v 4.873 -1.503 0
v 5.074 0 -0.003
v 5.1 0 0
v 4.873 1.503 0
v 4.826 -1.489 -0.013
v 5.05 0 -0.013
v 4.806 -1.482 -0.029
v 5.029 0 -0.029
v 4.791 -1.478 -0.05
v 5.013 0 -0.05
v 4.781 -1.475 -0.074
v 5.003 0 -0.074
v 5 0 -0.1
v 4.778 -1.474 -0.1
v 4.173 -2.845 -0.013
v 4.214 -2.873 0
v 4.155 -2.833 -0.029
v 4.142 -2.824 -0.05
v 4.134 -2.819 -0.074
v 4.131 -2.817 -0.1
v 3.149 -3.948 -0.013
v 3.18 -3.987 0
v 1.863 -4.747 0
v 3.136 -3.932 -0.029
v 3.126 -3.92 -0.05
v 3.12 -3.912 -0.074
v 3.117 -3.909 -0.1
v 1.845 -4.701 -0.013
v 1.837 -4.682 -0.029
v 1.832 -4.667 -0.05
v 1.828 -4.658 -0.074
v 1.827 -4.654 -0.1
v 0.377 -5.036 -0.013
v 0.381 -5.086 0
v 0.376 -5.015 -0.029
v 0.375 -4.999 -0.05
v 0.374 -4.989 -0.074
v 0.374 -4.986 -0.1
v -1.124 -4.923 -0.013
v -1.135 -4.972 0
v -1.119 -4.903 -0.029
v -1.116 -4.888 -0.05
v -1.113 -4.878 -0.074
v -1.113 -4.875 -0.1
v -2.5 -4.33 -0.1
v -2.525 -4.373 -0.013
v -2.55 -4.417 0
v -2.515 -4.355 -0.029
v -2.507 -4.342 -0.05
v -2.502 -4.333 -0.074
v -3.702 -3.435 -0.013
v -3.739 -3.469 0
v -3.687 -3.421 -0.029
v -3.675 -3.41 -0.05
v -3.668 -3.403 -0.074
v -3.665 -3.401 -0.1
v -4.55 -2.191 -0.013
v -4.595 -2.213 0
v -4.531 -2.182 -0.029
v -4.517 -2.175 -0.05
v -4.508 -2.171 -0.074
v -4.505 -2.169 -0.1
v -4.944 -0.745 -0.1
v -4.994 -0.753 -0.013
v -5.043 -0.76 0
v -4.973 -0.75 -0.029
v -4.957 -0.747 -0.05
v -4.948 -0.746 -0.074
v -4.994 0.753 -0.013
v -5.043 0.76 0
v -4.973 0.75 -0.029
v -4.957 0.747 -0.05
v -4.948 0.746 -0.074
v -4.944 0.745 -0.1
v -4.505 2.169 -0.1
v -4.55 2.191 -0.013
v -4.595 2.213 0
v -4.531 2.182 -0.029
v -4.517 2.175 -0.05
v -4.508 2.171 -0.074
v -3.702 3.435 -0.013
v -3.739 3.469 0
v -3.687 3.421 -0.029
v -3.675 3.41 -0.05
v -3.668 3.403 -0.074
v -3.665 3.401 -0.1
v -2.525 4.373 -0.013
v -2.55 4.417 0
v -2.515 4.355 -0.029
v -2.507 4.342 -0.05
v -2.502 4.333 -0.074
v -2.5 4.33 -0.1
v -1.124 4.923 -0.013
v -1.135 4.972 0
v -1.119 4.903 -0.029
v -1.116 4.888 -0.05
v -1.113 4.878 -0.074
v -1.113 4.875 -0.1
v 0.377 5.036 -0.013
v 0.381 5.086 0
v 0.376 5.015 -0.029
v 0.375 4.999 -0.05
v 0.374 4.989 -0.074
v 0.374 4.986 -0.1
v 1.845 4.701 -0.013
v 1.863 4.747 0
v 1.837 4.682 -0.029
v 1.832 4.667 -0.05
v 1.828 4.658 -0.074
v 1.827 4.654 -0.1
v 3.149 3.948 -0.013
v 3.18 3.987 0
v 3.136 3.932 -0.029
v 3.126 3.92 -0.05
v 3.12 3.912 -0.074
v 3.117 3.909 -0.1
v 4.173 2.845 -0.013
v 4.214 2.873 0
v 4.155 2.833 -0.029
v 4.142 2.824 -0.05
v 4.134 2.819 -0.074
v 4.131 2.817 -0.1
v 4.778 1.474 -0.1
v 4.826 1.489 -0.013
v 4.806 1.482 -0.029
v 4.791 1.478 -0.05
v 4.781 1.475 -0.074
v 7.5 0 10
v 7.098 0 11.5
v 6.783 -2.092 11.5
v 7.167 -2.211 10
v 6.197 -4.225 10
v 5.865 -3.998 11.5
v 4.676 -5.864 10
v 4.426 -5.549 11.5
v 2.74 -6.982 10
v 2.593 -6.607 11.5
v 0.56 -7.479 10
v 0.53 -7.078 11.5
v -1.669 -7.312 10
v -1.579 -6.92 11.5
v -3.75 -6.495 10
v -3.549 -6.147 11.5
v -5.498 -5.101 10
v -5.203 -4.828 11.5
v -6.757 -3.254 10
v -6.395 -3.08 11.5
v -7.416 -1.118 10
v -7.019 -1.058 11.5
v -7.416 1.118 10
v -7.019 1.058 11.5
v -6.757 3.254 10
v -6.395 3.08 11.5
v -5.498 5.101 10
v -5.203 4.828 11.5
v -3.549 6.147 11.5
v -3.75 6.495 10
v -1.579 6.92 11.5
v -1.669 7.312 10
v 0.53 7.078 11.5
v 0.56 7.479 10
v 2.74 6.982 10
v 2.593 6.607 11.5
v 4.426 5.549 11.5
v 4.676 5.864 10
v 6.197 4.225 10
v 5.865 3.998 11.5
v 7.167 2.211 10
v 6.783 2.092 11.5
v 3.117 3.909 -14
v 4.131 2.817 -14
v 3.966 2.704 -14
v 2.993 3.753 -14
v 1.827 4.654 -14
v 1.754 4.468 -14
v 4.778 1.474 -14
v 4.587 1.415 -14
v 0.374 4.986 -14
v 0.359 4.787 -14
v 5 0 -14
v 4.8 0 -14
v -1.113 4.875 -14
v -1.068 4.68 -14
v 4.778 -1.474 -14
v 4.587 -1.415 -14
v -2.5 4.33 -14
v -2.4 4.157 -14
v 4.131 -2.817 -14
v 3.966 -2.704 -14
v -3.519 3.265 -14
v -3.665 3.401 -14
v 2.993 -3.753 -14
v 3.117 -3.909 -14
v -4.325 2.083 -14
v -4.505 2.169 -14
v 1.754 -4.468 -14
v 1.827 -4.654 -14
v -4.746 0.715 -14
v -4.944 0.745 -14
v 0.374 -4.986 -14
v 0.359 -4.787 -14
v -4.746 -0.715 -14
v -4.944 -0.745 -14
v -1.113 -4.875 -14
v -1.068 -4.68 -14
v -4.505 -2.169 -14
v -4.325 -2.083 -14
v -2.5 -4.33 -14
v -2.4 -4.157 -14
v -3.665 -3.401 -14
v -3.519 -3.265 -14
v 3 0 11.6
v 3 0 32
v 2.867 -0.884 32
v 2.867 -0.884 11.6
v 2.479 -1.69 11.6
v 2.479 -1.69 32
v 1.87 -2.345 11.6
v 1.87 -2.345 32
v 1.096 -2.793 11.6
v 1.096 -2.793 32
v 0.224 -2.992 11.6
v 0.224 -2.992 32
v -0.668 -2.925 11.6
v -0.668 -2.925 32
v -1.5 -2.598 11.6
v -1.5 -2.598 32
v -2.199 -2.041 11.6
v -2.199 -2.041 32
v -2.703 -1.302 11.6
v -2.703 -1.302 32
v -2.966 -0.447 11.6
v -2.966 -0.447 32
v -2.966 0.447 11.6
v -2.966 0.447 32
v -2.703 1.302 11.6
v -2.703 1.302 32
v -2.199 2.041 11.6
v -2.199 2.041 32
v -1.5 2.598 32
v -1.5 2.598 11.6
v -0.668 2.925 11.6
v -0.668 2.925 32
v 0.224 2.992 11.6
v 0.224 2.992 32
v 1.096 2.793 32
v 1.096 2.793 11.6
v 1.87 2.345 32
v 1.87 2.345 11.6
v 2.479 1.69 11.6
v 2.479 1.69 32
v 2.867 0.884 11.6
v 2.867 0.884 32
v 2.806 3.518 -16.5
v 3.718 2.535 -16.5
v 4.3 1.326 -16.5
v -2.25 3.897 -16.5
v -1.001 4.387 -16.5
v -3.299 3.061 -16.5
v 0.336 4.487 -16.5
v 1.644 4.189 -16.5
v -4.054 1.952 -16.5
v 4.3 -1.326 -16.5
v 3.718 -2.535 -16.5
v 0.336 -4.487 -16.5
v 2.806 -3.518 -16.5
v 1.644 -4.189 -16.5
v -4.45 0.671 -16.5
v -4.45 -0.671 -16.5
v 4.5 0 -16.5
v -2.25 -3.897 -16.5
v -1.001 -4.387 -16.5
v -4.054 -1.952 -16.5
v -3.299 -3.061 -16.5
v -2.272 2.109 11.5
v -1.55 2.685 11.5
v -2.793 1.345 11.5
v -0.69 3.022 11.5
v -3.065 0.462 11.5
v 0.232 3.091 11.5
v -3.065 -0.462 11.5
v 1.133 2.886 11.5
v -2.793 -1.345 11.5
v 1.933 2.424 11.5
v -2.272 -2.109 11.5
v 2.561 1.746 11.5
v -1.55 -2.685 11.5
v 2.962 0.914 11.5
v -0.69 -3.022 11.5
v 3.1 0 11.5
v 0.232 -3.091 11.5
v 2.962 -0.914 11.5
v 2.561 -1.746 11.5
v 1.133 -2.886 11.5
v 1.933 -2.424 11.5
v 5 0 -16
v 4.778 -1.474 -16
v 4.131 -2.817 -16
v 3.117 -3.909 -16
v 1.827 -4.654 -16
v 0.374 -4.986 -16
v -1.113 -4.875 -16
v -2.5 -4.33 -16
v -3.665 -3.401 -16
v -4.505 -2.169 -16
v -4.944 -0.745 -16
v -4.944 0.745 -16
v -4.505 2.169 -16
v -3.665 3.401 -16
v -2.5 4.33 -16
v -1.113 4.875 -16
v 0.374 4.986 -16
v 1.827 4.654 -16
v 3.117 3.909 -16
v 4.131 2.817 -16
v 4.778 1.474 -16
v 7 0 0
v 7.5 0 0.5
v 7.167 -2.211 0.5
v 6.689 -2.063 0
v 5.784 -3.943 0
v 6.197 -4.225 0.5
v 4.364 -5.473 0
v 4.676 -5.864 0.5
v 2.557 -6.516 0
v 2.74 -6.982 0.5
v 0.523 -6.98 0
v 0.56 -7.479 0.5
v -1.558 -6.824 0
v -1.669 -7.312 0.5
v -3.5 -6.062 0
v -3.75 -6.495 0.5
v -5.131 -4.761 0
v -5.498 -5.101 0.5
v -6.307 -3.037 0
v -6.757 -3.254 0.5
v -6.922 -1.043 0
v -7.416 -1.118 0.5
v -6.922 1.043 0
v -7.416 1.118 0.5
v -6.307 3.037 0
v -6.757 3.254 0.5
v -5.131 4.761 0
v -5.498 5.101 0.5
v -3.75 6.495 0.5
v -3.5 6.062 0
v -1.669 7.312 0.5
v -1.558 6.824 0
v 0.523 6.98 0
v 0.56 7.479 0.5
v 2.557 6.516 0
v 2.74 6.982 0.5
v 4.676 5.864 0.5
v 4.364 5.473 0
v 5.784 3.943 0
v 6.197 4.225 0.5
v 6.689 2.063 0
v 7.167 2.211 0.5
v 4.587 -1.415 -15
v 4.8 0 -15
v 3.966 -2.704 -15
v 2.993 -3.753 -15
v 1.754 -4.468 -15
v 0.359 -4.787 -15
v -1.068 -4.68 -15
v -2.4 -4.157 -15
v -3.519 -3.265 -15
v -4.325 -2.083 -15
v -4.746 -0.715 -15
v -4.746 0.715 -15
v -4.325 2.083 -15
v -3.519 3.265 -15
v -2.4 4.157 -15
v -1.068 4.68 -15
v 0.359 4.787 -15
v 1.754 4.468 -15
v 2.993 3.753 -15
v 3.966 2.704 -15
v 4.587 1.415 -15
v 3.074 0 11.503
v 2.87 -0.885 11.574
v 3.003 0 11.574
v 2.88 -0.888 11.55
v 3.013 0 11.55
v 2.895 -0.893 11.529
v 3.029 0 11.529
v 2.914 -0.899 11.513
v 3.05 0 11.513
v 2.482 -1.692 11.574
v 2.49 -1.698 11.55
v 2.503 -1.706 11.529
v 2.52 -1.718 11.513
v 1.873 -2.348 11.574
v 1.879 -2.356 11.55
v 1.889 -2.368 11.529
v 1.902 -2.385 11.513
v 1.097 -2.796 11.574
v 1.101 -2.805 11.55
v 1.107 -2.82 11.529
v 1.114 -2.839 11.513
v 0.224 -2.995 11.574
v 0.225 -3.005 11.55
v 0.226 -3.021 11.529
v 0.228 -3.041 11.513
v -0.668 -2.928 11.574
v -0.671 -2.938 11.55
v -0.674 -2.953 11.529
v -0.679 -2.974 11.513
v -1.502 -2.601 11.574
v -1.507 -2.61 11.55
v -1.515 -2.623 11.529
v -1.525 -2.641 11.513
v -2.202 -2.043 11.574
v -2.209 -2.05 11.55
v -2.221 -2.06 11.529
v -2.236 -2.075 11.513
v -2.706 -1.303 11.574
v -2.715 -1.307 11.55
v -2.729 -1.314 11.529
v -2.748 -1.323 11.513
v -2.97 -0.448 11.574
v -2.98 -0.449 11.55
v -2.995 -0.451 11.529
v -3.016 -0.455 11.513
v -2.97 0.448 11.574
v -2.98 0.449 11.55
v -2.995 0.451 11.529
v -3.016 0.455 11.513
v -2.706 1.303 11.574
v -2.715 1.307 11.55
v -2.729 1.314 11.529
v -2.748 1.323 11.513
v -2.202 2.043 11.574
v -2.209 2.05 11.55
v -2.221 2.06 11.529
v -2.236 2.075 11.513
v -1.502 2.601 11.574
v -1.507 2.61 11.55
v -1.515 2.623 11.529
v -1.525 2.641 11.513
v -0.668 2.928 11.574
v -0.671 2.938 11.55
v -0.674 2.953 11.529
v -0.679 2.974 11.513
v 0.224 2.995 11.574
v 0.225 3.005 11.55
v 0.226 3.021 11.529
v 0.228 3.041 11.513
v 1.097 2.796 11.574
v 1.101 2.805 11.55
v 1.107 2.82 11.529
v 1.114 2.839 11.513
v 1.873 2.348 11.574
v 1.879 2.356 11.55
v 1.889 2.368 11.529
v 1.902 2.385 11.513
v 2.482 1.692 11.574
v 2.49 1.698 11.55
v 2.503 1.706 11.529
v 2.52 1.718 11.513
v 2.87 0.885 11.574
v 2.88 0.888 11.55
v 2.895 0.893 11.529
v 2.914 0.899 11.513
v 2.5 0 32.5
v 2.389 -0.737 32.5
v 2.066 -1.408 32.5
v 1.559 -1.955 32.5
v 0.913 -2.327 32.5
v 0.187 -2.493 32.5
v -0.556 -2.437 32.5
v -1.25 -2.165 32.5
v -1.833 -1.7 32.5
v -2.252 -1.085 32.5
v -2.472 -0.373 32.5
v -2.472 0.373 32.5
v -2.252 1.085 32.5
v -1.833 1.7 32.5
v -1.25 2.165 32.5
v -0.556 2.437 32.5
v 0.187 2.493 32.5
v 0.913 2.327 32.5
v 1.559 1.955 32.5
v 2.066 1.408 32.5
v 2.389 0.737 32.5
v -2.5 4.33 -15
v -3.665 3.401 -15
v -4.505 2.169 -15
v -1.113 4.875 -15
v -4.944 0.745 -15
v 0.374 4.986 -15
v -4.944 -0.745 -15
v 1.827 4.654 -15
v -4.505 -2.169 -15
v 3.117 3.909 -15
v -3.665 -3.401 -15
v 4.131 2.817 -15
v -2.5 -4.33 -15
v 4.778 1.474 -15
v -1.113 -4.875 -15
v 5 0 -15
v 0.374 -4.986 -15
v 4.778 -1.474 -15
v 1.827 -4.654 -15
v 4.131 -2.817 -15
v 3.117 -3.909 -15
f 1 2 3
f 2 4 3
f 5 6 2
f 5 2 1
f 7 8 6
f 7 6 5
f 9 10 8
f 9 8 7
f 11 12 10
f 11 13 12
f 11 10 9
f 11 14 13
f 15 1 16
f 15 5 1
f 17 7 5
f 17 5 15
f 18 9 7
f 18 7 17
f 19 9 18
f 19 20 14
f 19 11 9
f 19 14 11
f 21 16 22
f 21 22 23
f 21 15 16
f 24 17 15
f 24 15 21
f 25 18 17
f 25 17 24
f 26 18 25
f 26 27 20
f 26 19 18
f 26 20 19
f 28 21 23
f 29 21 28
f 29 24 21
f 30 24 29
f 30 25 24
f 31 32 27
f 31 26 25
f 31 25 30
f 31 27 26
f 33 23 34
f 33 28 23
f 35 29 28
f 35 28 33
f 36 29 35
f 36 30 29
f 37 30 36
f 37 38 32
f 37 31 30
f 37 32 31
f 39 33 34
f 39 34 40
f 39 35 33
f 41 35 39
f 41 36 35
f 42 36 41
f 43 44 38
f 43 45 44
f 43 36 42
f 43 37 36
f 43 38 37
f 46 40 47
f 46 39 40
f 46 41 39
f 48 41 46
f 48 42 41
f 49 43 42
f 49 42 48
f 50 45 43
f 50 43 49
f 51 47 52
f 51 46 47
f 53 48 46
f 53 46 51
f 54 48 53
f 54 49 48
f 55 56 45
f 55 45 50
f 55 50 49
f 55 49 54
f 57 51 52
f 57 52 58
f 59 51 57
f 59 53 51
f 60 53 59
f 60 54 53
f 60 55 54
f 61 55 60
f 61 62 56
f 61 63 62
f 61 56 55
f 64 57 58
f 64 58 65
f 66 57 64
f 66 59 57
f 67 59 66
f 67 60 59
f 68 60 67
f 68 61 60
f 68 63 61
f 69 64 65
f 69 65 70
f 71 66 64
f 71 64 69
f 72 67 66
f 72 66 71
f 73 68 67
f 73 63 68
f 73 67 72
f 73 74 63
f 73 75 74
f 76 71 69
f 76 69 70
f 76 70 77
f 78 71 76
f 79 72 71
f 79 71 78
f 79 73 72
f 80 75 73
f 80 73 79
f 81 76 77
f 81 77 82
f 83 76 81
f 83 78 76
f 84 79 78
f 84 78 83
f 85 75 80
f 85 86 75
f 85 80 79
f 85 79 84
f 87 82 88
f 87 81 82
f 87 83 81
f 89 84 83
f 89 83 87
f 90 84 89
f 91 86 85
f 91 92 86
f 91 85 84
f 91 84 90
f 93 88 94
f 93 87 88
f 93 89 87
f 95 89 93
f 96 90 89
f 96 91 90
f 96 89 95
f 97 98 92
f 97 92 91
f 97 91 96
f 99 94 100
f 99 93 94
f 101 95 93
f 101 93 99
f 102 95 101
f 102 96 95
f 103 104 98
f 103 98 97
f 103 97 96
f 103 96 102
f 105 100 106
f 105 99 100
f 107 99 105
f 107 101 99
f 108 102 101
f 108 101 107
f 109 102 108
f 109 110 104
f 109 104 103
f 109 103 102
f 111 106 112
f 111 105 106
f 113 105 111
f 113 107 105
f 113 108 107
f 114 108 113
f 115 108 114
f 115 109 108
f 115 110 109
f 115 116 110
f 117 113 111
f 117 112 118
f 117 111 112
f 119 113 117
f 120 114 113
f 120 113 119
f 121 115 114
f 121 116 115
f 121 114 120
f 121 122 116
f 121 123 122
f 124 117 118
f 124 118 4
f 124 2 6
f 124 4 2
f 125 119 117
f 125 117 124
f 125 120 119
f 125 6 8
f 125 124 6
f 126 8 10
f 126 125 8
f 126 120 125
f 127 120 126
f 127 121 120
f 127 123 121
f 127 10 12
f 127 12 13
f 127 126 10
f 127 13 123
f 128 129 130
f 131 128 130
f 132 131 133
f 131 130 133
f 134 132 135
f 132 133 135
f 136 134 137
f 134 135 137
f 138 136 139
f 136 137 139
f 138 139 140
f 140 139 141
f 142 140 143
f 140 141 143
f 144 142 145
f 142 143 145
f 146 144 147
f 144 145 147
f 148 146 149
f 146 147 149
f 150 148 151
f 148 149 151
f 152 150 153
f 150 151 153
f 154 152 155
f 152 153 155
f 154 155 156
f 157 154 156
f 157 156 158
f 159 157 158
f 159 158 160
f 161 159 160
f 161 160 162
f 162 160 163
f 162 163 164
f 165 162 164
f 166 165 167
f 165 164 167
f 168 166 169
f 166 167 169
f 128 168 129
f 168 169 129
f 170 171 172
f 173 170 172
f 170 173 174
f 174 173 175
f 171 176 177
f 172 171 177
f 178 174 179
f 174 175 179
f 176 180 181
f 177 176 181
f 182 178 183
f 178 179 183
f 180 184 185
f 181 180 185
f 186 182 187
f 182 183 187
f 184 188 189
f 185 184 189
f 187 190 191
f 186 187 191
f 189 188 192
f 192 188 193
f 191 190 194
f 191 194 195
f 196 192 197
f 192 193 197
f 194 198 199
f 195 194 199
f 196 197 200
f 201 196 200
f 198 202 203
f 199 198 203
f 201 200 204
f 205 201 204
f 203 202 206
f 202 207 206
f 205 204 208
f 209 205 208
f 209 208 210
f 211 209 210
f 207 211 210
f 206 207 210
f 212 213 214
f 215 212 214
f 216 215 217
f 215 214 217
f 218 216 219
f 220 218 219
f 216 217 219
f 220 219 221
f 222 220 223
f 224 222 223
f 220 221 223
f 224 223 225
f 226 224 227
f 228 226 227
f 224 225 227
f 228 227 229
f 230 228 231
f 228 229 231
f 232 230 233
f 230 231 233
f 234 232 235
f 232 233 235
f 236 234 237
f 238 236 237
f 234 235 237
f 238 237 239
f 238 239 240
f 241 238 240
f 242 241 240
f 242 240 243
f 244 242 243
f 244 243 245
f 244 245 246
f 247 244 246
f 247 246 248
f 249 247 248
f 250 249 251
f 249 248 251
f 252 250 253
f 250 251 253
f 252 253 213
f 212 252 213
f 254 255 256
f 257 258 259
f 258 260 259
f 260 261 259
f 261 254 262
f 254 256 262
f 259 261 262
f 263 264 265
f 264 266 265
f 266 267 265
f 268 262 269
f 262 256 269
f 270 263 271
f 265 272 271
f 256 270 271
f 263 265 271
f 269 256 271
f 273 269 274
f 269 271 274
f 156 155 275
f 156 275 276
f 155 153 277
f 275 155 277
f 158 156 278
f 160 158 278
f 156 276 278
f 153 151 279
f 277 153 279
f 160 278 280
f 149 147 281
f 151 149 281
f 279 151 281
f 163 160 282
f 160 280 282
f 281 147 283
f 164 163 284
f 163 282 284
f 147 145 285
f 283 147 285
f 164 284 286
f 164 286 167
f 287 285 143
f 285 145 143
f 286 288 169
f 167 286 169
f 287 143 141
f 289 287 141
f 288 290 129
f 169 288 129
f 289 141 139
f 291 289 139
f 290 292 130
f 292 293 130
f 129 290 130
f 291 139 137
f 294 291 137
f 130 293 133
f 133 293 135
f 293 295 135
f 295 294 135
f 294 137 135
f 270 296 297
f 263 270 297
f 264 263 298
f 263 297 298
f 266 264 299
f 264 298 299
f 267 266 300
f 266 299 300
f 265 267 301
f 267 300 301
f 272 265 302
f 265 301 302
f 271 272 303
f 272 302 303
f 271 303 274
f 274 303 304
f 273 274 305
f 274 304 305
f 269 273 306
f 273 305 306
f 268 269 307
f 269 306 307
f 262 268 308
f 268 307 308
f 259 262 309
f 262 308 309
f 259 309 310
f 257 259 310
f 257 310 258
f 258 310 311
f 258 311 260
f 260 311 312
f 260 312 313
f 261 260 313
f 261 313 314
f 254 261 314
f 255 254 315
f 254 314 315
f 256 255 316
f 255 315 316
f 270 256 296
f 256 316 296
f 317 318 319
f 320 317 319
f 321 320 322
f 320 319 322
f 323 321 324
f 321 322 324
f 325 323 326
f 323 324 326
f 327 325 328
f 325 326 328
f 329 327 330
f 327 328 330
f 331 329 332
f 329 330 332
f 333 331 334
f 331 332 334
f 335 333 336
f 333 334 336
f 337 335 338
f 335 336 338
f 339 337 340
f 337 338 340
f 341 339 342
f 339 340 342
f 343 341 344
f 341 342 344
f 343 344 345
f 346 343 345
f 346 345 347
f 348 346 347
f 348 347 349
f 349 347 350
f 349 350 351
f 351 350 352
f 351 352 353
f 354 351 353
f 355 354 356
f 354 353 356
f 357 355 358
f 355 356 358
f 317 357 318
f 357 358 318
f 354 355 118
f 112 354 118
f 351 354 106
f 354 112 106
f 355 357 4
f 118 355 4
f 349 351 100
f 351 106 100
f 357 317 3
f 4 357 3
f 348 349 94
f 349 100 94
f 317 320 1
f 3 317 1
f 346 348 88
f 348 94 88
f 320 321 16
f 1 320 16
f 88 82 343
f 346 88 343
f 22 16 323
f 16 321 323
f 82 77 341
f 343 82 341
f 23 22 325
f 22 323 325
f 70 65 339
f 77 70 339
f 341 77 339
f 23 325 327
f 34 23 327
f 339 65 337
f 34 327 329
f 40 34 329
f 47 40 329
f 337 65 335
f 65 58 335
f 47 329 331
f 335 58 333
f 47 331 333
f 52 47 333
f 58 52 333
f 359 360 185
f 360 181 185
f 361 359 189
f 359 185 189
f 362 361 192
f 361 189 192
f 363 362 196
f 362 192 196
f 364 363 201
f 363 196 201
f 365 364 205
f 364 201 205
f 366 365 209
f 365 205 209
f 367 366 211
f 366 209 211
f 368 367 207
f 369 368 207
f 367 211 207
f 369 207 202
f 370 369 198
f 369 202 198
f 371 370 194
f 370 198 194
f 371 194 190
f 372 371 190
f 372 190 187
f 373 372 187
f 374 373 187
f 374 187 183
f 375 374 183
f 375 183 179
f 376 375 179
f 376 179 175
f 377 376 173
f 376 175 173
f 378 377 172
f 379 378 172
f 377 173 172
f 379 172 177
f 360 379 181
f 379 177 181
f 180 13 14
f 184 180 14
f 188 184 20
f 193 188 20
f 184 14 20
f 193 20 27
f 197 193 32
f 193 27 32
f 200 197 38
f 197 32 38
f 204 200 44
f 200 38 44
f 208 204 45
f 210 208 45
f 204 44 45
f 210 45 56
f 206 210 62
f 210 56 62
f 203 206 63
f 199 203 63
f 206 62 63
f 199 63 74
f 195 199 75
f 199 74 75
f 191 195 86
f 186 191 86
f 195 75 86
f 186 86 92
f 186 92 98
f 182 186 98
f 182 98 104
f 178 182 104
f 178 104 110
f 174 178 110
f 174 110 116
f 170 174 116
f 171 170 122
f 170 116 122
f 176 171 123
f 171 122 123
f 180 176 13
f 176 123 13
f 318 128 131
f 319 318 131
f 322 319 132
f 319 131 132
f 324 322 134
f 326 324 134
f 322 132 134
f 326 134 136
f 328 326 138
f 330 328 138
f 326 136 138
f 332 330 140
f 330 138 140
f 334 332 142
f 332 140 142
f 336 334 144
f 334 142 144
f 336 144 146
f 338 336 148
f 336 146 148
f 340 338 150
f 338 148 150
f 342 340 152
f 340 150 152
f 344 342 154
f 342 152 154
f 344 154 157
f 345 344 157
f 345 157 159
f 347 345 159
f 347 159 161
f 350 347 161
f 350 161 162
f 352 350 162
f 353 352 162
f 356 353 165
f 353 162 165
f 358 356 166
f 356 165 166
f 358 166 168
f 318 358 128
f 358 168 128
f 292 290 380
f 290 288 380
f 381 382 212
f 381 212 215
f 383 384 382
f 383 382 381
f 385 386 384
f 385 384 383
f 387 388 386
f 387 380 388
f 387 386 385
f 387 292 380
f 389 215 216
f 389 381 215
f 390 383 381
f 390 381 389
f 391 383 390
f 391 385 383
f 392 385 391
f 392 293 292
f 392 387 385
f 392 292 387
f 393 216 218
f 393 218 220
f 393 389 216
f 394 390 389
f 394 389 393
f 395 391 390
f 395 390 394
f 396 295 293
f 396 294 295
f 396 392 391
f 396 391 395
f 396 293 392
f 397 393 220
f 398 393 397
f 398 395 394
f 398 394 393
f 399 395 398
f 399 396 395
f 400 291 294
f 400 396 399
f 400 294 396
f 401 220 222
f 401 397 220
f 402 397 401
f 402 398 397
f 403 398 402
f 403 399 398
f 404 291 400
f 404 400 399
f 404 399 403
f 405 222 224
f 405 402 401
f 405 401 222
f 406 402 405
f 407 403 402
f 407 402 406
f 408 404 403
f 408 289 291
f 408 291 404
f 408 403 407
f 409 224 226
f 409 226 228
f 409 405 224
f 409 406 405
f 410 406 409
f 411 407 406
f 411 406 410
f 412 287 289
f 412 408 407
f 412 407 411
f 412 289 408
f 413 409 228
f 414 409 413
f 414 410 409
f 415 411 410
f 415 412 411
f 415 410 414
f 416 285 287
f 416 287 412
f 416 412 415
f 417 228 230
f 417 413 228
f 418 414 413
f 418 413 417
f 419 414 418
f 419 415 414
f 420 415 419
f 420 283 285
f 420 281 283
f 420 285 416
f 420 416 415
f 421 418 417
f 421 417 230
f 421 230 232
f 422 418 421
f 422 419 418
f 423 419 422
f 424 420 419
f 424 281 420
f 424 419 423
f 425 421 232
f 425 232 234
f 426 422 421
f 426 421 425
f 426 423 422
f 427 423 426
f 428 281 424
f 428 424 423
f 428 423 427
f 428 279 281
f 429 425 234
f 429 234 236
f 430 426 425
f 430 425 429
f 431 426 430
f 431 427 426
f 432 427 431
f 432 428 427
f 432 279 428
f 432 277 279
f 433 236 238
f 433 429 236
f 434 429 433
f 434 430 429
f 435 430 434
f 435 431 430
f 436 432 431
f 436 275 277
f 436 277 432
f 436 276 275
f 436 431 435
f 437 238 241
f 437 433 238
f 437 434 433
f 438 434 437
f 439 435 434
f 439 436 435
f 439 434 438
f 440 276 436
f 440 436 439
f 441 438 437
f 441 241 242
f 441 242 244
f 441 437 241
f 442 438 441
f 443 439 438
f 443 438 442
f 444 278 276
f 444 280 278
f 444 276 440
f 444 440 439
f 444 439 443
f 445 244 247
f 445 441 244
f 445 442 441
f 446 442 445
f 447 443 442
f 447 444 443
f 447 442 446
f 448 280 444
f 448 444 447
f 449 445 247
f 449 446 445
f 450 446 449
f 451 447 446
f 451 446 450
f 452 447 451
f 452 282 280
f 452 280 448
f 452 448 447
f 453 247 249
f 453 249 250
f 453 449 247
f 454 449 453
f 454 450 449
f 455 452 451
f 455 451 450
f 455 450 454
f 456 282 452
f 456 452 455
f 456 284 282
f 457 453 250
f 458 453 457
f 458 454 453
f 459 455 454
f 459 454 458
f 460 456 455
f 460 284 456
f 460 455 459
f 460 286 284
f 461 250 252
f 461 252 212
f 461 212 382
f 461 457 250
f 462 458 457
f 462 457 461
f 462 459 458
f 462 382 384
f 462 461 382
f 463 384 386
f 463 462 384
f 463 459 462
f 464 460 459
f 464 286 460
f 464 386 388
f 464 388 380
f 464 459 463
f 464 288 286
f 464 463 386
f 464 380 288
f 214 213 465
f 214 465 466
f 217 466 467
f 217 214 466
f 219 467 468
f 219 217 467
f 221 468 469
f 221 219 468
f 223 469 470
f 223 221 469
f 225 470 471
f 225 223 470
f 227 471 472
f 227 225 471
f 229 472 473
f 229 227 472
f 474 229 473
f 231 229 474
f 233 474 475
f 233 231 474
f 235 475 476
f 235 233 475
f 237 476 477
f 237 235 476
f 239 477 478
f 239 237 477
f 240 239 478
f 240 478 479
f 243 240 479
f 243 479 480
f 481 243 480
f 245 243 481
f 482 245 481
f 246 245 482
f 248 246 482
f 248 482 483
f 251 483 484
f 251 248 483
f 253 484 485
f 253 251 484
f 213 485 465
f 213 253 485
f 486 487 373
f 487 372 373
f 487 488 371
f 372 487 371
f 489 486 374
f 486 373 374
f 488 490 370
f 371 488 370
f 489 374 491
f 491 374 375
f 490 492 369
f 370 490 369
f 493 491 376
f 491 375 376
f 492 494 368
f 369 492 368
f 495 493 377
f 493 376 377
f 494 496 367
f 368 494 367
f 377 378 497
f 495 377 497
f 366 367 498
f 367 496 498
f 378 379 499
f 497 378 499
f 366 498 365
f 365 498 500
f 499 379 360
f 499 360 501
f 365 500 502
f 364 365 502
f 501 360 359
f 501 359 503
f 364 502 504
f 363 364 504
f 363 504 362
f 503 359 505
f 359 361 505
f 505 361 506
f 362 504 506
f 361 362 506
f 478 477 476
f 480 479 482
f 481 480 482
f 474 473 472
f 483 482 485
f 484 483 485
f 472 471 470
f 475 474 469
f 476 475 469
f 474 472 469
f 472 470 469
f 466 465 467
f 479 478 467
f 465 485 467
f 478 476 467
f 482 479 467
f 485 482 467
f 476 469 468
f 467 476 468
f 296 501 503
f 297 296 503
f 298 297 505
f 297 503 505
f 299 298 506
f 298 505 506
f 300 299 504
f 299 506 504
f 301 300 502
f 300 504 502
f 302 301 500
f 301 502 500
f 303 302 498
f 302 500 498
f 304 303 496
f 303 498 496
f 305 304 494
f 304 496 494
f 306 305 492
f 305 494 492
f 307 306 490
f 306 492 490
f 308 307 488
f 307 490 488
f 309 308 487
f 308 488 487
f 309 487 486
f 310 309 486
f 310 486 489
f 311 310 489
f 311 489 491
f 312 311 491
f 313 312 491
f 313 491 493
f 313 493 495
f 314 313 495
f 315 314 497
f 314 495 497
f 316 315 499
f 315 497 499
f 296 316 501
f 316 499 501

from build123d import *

# Parameters (mm, degrees)
F2_SIZE  = 0.5
F3_R     = 0.1
F4_SIZE2 = 0.4019237886
F4_SIZE  = 1.5


with BuildPart() as f1:
    # F0 (on Front) → F1 (revolve)
    with BuildSketch(Plane.XZ):
        Polygon((3, 32.5), (0, 32.5), (0, -16.5), (5, -16.5), (5, -15), (4.8, -15), (4.8, -14), (5, -14), (5, 0), (7.5, 0), (7.5, 11.5), (3, 11.5), align=None)
    revolve(axis=Axis((0, 0, -4.8274807632), (0, 0, -1)))

    # F2
    f2_edges = [f1.edges().sort_by_distance(p)[0] for p in [
        (-5, 0, -16.5),
        (-3, 0, 32.5),
        (-7.5, 0, 0),
    ]]
    chamfer(f2_edges, length=F2_SIZE)

    # F3
    f3_edges = [f1.edges().sort_by_distance(p)[0] for p in [
        (-5, 0, 0),
        (-3, 0, 11.5),
    ]]
    fillet(f3_edges, radius=F3_R)

    # F4
    f4_edges = [f1.edges().sort_by_distance(p)[0] for p in [
        (-7.5, 0, 11.5),
    ]]
    f4_side = f1.faces().sort_by_distance((-7.5, 0, 6))[0]
    chamfer(f4_edges, length=F4_SIZE, length2=F4_SIZE2, reference=f4_side)


solid = f1.part
